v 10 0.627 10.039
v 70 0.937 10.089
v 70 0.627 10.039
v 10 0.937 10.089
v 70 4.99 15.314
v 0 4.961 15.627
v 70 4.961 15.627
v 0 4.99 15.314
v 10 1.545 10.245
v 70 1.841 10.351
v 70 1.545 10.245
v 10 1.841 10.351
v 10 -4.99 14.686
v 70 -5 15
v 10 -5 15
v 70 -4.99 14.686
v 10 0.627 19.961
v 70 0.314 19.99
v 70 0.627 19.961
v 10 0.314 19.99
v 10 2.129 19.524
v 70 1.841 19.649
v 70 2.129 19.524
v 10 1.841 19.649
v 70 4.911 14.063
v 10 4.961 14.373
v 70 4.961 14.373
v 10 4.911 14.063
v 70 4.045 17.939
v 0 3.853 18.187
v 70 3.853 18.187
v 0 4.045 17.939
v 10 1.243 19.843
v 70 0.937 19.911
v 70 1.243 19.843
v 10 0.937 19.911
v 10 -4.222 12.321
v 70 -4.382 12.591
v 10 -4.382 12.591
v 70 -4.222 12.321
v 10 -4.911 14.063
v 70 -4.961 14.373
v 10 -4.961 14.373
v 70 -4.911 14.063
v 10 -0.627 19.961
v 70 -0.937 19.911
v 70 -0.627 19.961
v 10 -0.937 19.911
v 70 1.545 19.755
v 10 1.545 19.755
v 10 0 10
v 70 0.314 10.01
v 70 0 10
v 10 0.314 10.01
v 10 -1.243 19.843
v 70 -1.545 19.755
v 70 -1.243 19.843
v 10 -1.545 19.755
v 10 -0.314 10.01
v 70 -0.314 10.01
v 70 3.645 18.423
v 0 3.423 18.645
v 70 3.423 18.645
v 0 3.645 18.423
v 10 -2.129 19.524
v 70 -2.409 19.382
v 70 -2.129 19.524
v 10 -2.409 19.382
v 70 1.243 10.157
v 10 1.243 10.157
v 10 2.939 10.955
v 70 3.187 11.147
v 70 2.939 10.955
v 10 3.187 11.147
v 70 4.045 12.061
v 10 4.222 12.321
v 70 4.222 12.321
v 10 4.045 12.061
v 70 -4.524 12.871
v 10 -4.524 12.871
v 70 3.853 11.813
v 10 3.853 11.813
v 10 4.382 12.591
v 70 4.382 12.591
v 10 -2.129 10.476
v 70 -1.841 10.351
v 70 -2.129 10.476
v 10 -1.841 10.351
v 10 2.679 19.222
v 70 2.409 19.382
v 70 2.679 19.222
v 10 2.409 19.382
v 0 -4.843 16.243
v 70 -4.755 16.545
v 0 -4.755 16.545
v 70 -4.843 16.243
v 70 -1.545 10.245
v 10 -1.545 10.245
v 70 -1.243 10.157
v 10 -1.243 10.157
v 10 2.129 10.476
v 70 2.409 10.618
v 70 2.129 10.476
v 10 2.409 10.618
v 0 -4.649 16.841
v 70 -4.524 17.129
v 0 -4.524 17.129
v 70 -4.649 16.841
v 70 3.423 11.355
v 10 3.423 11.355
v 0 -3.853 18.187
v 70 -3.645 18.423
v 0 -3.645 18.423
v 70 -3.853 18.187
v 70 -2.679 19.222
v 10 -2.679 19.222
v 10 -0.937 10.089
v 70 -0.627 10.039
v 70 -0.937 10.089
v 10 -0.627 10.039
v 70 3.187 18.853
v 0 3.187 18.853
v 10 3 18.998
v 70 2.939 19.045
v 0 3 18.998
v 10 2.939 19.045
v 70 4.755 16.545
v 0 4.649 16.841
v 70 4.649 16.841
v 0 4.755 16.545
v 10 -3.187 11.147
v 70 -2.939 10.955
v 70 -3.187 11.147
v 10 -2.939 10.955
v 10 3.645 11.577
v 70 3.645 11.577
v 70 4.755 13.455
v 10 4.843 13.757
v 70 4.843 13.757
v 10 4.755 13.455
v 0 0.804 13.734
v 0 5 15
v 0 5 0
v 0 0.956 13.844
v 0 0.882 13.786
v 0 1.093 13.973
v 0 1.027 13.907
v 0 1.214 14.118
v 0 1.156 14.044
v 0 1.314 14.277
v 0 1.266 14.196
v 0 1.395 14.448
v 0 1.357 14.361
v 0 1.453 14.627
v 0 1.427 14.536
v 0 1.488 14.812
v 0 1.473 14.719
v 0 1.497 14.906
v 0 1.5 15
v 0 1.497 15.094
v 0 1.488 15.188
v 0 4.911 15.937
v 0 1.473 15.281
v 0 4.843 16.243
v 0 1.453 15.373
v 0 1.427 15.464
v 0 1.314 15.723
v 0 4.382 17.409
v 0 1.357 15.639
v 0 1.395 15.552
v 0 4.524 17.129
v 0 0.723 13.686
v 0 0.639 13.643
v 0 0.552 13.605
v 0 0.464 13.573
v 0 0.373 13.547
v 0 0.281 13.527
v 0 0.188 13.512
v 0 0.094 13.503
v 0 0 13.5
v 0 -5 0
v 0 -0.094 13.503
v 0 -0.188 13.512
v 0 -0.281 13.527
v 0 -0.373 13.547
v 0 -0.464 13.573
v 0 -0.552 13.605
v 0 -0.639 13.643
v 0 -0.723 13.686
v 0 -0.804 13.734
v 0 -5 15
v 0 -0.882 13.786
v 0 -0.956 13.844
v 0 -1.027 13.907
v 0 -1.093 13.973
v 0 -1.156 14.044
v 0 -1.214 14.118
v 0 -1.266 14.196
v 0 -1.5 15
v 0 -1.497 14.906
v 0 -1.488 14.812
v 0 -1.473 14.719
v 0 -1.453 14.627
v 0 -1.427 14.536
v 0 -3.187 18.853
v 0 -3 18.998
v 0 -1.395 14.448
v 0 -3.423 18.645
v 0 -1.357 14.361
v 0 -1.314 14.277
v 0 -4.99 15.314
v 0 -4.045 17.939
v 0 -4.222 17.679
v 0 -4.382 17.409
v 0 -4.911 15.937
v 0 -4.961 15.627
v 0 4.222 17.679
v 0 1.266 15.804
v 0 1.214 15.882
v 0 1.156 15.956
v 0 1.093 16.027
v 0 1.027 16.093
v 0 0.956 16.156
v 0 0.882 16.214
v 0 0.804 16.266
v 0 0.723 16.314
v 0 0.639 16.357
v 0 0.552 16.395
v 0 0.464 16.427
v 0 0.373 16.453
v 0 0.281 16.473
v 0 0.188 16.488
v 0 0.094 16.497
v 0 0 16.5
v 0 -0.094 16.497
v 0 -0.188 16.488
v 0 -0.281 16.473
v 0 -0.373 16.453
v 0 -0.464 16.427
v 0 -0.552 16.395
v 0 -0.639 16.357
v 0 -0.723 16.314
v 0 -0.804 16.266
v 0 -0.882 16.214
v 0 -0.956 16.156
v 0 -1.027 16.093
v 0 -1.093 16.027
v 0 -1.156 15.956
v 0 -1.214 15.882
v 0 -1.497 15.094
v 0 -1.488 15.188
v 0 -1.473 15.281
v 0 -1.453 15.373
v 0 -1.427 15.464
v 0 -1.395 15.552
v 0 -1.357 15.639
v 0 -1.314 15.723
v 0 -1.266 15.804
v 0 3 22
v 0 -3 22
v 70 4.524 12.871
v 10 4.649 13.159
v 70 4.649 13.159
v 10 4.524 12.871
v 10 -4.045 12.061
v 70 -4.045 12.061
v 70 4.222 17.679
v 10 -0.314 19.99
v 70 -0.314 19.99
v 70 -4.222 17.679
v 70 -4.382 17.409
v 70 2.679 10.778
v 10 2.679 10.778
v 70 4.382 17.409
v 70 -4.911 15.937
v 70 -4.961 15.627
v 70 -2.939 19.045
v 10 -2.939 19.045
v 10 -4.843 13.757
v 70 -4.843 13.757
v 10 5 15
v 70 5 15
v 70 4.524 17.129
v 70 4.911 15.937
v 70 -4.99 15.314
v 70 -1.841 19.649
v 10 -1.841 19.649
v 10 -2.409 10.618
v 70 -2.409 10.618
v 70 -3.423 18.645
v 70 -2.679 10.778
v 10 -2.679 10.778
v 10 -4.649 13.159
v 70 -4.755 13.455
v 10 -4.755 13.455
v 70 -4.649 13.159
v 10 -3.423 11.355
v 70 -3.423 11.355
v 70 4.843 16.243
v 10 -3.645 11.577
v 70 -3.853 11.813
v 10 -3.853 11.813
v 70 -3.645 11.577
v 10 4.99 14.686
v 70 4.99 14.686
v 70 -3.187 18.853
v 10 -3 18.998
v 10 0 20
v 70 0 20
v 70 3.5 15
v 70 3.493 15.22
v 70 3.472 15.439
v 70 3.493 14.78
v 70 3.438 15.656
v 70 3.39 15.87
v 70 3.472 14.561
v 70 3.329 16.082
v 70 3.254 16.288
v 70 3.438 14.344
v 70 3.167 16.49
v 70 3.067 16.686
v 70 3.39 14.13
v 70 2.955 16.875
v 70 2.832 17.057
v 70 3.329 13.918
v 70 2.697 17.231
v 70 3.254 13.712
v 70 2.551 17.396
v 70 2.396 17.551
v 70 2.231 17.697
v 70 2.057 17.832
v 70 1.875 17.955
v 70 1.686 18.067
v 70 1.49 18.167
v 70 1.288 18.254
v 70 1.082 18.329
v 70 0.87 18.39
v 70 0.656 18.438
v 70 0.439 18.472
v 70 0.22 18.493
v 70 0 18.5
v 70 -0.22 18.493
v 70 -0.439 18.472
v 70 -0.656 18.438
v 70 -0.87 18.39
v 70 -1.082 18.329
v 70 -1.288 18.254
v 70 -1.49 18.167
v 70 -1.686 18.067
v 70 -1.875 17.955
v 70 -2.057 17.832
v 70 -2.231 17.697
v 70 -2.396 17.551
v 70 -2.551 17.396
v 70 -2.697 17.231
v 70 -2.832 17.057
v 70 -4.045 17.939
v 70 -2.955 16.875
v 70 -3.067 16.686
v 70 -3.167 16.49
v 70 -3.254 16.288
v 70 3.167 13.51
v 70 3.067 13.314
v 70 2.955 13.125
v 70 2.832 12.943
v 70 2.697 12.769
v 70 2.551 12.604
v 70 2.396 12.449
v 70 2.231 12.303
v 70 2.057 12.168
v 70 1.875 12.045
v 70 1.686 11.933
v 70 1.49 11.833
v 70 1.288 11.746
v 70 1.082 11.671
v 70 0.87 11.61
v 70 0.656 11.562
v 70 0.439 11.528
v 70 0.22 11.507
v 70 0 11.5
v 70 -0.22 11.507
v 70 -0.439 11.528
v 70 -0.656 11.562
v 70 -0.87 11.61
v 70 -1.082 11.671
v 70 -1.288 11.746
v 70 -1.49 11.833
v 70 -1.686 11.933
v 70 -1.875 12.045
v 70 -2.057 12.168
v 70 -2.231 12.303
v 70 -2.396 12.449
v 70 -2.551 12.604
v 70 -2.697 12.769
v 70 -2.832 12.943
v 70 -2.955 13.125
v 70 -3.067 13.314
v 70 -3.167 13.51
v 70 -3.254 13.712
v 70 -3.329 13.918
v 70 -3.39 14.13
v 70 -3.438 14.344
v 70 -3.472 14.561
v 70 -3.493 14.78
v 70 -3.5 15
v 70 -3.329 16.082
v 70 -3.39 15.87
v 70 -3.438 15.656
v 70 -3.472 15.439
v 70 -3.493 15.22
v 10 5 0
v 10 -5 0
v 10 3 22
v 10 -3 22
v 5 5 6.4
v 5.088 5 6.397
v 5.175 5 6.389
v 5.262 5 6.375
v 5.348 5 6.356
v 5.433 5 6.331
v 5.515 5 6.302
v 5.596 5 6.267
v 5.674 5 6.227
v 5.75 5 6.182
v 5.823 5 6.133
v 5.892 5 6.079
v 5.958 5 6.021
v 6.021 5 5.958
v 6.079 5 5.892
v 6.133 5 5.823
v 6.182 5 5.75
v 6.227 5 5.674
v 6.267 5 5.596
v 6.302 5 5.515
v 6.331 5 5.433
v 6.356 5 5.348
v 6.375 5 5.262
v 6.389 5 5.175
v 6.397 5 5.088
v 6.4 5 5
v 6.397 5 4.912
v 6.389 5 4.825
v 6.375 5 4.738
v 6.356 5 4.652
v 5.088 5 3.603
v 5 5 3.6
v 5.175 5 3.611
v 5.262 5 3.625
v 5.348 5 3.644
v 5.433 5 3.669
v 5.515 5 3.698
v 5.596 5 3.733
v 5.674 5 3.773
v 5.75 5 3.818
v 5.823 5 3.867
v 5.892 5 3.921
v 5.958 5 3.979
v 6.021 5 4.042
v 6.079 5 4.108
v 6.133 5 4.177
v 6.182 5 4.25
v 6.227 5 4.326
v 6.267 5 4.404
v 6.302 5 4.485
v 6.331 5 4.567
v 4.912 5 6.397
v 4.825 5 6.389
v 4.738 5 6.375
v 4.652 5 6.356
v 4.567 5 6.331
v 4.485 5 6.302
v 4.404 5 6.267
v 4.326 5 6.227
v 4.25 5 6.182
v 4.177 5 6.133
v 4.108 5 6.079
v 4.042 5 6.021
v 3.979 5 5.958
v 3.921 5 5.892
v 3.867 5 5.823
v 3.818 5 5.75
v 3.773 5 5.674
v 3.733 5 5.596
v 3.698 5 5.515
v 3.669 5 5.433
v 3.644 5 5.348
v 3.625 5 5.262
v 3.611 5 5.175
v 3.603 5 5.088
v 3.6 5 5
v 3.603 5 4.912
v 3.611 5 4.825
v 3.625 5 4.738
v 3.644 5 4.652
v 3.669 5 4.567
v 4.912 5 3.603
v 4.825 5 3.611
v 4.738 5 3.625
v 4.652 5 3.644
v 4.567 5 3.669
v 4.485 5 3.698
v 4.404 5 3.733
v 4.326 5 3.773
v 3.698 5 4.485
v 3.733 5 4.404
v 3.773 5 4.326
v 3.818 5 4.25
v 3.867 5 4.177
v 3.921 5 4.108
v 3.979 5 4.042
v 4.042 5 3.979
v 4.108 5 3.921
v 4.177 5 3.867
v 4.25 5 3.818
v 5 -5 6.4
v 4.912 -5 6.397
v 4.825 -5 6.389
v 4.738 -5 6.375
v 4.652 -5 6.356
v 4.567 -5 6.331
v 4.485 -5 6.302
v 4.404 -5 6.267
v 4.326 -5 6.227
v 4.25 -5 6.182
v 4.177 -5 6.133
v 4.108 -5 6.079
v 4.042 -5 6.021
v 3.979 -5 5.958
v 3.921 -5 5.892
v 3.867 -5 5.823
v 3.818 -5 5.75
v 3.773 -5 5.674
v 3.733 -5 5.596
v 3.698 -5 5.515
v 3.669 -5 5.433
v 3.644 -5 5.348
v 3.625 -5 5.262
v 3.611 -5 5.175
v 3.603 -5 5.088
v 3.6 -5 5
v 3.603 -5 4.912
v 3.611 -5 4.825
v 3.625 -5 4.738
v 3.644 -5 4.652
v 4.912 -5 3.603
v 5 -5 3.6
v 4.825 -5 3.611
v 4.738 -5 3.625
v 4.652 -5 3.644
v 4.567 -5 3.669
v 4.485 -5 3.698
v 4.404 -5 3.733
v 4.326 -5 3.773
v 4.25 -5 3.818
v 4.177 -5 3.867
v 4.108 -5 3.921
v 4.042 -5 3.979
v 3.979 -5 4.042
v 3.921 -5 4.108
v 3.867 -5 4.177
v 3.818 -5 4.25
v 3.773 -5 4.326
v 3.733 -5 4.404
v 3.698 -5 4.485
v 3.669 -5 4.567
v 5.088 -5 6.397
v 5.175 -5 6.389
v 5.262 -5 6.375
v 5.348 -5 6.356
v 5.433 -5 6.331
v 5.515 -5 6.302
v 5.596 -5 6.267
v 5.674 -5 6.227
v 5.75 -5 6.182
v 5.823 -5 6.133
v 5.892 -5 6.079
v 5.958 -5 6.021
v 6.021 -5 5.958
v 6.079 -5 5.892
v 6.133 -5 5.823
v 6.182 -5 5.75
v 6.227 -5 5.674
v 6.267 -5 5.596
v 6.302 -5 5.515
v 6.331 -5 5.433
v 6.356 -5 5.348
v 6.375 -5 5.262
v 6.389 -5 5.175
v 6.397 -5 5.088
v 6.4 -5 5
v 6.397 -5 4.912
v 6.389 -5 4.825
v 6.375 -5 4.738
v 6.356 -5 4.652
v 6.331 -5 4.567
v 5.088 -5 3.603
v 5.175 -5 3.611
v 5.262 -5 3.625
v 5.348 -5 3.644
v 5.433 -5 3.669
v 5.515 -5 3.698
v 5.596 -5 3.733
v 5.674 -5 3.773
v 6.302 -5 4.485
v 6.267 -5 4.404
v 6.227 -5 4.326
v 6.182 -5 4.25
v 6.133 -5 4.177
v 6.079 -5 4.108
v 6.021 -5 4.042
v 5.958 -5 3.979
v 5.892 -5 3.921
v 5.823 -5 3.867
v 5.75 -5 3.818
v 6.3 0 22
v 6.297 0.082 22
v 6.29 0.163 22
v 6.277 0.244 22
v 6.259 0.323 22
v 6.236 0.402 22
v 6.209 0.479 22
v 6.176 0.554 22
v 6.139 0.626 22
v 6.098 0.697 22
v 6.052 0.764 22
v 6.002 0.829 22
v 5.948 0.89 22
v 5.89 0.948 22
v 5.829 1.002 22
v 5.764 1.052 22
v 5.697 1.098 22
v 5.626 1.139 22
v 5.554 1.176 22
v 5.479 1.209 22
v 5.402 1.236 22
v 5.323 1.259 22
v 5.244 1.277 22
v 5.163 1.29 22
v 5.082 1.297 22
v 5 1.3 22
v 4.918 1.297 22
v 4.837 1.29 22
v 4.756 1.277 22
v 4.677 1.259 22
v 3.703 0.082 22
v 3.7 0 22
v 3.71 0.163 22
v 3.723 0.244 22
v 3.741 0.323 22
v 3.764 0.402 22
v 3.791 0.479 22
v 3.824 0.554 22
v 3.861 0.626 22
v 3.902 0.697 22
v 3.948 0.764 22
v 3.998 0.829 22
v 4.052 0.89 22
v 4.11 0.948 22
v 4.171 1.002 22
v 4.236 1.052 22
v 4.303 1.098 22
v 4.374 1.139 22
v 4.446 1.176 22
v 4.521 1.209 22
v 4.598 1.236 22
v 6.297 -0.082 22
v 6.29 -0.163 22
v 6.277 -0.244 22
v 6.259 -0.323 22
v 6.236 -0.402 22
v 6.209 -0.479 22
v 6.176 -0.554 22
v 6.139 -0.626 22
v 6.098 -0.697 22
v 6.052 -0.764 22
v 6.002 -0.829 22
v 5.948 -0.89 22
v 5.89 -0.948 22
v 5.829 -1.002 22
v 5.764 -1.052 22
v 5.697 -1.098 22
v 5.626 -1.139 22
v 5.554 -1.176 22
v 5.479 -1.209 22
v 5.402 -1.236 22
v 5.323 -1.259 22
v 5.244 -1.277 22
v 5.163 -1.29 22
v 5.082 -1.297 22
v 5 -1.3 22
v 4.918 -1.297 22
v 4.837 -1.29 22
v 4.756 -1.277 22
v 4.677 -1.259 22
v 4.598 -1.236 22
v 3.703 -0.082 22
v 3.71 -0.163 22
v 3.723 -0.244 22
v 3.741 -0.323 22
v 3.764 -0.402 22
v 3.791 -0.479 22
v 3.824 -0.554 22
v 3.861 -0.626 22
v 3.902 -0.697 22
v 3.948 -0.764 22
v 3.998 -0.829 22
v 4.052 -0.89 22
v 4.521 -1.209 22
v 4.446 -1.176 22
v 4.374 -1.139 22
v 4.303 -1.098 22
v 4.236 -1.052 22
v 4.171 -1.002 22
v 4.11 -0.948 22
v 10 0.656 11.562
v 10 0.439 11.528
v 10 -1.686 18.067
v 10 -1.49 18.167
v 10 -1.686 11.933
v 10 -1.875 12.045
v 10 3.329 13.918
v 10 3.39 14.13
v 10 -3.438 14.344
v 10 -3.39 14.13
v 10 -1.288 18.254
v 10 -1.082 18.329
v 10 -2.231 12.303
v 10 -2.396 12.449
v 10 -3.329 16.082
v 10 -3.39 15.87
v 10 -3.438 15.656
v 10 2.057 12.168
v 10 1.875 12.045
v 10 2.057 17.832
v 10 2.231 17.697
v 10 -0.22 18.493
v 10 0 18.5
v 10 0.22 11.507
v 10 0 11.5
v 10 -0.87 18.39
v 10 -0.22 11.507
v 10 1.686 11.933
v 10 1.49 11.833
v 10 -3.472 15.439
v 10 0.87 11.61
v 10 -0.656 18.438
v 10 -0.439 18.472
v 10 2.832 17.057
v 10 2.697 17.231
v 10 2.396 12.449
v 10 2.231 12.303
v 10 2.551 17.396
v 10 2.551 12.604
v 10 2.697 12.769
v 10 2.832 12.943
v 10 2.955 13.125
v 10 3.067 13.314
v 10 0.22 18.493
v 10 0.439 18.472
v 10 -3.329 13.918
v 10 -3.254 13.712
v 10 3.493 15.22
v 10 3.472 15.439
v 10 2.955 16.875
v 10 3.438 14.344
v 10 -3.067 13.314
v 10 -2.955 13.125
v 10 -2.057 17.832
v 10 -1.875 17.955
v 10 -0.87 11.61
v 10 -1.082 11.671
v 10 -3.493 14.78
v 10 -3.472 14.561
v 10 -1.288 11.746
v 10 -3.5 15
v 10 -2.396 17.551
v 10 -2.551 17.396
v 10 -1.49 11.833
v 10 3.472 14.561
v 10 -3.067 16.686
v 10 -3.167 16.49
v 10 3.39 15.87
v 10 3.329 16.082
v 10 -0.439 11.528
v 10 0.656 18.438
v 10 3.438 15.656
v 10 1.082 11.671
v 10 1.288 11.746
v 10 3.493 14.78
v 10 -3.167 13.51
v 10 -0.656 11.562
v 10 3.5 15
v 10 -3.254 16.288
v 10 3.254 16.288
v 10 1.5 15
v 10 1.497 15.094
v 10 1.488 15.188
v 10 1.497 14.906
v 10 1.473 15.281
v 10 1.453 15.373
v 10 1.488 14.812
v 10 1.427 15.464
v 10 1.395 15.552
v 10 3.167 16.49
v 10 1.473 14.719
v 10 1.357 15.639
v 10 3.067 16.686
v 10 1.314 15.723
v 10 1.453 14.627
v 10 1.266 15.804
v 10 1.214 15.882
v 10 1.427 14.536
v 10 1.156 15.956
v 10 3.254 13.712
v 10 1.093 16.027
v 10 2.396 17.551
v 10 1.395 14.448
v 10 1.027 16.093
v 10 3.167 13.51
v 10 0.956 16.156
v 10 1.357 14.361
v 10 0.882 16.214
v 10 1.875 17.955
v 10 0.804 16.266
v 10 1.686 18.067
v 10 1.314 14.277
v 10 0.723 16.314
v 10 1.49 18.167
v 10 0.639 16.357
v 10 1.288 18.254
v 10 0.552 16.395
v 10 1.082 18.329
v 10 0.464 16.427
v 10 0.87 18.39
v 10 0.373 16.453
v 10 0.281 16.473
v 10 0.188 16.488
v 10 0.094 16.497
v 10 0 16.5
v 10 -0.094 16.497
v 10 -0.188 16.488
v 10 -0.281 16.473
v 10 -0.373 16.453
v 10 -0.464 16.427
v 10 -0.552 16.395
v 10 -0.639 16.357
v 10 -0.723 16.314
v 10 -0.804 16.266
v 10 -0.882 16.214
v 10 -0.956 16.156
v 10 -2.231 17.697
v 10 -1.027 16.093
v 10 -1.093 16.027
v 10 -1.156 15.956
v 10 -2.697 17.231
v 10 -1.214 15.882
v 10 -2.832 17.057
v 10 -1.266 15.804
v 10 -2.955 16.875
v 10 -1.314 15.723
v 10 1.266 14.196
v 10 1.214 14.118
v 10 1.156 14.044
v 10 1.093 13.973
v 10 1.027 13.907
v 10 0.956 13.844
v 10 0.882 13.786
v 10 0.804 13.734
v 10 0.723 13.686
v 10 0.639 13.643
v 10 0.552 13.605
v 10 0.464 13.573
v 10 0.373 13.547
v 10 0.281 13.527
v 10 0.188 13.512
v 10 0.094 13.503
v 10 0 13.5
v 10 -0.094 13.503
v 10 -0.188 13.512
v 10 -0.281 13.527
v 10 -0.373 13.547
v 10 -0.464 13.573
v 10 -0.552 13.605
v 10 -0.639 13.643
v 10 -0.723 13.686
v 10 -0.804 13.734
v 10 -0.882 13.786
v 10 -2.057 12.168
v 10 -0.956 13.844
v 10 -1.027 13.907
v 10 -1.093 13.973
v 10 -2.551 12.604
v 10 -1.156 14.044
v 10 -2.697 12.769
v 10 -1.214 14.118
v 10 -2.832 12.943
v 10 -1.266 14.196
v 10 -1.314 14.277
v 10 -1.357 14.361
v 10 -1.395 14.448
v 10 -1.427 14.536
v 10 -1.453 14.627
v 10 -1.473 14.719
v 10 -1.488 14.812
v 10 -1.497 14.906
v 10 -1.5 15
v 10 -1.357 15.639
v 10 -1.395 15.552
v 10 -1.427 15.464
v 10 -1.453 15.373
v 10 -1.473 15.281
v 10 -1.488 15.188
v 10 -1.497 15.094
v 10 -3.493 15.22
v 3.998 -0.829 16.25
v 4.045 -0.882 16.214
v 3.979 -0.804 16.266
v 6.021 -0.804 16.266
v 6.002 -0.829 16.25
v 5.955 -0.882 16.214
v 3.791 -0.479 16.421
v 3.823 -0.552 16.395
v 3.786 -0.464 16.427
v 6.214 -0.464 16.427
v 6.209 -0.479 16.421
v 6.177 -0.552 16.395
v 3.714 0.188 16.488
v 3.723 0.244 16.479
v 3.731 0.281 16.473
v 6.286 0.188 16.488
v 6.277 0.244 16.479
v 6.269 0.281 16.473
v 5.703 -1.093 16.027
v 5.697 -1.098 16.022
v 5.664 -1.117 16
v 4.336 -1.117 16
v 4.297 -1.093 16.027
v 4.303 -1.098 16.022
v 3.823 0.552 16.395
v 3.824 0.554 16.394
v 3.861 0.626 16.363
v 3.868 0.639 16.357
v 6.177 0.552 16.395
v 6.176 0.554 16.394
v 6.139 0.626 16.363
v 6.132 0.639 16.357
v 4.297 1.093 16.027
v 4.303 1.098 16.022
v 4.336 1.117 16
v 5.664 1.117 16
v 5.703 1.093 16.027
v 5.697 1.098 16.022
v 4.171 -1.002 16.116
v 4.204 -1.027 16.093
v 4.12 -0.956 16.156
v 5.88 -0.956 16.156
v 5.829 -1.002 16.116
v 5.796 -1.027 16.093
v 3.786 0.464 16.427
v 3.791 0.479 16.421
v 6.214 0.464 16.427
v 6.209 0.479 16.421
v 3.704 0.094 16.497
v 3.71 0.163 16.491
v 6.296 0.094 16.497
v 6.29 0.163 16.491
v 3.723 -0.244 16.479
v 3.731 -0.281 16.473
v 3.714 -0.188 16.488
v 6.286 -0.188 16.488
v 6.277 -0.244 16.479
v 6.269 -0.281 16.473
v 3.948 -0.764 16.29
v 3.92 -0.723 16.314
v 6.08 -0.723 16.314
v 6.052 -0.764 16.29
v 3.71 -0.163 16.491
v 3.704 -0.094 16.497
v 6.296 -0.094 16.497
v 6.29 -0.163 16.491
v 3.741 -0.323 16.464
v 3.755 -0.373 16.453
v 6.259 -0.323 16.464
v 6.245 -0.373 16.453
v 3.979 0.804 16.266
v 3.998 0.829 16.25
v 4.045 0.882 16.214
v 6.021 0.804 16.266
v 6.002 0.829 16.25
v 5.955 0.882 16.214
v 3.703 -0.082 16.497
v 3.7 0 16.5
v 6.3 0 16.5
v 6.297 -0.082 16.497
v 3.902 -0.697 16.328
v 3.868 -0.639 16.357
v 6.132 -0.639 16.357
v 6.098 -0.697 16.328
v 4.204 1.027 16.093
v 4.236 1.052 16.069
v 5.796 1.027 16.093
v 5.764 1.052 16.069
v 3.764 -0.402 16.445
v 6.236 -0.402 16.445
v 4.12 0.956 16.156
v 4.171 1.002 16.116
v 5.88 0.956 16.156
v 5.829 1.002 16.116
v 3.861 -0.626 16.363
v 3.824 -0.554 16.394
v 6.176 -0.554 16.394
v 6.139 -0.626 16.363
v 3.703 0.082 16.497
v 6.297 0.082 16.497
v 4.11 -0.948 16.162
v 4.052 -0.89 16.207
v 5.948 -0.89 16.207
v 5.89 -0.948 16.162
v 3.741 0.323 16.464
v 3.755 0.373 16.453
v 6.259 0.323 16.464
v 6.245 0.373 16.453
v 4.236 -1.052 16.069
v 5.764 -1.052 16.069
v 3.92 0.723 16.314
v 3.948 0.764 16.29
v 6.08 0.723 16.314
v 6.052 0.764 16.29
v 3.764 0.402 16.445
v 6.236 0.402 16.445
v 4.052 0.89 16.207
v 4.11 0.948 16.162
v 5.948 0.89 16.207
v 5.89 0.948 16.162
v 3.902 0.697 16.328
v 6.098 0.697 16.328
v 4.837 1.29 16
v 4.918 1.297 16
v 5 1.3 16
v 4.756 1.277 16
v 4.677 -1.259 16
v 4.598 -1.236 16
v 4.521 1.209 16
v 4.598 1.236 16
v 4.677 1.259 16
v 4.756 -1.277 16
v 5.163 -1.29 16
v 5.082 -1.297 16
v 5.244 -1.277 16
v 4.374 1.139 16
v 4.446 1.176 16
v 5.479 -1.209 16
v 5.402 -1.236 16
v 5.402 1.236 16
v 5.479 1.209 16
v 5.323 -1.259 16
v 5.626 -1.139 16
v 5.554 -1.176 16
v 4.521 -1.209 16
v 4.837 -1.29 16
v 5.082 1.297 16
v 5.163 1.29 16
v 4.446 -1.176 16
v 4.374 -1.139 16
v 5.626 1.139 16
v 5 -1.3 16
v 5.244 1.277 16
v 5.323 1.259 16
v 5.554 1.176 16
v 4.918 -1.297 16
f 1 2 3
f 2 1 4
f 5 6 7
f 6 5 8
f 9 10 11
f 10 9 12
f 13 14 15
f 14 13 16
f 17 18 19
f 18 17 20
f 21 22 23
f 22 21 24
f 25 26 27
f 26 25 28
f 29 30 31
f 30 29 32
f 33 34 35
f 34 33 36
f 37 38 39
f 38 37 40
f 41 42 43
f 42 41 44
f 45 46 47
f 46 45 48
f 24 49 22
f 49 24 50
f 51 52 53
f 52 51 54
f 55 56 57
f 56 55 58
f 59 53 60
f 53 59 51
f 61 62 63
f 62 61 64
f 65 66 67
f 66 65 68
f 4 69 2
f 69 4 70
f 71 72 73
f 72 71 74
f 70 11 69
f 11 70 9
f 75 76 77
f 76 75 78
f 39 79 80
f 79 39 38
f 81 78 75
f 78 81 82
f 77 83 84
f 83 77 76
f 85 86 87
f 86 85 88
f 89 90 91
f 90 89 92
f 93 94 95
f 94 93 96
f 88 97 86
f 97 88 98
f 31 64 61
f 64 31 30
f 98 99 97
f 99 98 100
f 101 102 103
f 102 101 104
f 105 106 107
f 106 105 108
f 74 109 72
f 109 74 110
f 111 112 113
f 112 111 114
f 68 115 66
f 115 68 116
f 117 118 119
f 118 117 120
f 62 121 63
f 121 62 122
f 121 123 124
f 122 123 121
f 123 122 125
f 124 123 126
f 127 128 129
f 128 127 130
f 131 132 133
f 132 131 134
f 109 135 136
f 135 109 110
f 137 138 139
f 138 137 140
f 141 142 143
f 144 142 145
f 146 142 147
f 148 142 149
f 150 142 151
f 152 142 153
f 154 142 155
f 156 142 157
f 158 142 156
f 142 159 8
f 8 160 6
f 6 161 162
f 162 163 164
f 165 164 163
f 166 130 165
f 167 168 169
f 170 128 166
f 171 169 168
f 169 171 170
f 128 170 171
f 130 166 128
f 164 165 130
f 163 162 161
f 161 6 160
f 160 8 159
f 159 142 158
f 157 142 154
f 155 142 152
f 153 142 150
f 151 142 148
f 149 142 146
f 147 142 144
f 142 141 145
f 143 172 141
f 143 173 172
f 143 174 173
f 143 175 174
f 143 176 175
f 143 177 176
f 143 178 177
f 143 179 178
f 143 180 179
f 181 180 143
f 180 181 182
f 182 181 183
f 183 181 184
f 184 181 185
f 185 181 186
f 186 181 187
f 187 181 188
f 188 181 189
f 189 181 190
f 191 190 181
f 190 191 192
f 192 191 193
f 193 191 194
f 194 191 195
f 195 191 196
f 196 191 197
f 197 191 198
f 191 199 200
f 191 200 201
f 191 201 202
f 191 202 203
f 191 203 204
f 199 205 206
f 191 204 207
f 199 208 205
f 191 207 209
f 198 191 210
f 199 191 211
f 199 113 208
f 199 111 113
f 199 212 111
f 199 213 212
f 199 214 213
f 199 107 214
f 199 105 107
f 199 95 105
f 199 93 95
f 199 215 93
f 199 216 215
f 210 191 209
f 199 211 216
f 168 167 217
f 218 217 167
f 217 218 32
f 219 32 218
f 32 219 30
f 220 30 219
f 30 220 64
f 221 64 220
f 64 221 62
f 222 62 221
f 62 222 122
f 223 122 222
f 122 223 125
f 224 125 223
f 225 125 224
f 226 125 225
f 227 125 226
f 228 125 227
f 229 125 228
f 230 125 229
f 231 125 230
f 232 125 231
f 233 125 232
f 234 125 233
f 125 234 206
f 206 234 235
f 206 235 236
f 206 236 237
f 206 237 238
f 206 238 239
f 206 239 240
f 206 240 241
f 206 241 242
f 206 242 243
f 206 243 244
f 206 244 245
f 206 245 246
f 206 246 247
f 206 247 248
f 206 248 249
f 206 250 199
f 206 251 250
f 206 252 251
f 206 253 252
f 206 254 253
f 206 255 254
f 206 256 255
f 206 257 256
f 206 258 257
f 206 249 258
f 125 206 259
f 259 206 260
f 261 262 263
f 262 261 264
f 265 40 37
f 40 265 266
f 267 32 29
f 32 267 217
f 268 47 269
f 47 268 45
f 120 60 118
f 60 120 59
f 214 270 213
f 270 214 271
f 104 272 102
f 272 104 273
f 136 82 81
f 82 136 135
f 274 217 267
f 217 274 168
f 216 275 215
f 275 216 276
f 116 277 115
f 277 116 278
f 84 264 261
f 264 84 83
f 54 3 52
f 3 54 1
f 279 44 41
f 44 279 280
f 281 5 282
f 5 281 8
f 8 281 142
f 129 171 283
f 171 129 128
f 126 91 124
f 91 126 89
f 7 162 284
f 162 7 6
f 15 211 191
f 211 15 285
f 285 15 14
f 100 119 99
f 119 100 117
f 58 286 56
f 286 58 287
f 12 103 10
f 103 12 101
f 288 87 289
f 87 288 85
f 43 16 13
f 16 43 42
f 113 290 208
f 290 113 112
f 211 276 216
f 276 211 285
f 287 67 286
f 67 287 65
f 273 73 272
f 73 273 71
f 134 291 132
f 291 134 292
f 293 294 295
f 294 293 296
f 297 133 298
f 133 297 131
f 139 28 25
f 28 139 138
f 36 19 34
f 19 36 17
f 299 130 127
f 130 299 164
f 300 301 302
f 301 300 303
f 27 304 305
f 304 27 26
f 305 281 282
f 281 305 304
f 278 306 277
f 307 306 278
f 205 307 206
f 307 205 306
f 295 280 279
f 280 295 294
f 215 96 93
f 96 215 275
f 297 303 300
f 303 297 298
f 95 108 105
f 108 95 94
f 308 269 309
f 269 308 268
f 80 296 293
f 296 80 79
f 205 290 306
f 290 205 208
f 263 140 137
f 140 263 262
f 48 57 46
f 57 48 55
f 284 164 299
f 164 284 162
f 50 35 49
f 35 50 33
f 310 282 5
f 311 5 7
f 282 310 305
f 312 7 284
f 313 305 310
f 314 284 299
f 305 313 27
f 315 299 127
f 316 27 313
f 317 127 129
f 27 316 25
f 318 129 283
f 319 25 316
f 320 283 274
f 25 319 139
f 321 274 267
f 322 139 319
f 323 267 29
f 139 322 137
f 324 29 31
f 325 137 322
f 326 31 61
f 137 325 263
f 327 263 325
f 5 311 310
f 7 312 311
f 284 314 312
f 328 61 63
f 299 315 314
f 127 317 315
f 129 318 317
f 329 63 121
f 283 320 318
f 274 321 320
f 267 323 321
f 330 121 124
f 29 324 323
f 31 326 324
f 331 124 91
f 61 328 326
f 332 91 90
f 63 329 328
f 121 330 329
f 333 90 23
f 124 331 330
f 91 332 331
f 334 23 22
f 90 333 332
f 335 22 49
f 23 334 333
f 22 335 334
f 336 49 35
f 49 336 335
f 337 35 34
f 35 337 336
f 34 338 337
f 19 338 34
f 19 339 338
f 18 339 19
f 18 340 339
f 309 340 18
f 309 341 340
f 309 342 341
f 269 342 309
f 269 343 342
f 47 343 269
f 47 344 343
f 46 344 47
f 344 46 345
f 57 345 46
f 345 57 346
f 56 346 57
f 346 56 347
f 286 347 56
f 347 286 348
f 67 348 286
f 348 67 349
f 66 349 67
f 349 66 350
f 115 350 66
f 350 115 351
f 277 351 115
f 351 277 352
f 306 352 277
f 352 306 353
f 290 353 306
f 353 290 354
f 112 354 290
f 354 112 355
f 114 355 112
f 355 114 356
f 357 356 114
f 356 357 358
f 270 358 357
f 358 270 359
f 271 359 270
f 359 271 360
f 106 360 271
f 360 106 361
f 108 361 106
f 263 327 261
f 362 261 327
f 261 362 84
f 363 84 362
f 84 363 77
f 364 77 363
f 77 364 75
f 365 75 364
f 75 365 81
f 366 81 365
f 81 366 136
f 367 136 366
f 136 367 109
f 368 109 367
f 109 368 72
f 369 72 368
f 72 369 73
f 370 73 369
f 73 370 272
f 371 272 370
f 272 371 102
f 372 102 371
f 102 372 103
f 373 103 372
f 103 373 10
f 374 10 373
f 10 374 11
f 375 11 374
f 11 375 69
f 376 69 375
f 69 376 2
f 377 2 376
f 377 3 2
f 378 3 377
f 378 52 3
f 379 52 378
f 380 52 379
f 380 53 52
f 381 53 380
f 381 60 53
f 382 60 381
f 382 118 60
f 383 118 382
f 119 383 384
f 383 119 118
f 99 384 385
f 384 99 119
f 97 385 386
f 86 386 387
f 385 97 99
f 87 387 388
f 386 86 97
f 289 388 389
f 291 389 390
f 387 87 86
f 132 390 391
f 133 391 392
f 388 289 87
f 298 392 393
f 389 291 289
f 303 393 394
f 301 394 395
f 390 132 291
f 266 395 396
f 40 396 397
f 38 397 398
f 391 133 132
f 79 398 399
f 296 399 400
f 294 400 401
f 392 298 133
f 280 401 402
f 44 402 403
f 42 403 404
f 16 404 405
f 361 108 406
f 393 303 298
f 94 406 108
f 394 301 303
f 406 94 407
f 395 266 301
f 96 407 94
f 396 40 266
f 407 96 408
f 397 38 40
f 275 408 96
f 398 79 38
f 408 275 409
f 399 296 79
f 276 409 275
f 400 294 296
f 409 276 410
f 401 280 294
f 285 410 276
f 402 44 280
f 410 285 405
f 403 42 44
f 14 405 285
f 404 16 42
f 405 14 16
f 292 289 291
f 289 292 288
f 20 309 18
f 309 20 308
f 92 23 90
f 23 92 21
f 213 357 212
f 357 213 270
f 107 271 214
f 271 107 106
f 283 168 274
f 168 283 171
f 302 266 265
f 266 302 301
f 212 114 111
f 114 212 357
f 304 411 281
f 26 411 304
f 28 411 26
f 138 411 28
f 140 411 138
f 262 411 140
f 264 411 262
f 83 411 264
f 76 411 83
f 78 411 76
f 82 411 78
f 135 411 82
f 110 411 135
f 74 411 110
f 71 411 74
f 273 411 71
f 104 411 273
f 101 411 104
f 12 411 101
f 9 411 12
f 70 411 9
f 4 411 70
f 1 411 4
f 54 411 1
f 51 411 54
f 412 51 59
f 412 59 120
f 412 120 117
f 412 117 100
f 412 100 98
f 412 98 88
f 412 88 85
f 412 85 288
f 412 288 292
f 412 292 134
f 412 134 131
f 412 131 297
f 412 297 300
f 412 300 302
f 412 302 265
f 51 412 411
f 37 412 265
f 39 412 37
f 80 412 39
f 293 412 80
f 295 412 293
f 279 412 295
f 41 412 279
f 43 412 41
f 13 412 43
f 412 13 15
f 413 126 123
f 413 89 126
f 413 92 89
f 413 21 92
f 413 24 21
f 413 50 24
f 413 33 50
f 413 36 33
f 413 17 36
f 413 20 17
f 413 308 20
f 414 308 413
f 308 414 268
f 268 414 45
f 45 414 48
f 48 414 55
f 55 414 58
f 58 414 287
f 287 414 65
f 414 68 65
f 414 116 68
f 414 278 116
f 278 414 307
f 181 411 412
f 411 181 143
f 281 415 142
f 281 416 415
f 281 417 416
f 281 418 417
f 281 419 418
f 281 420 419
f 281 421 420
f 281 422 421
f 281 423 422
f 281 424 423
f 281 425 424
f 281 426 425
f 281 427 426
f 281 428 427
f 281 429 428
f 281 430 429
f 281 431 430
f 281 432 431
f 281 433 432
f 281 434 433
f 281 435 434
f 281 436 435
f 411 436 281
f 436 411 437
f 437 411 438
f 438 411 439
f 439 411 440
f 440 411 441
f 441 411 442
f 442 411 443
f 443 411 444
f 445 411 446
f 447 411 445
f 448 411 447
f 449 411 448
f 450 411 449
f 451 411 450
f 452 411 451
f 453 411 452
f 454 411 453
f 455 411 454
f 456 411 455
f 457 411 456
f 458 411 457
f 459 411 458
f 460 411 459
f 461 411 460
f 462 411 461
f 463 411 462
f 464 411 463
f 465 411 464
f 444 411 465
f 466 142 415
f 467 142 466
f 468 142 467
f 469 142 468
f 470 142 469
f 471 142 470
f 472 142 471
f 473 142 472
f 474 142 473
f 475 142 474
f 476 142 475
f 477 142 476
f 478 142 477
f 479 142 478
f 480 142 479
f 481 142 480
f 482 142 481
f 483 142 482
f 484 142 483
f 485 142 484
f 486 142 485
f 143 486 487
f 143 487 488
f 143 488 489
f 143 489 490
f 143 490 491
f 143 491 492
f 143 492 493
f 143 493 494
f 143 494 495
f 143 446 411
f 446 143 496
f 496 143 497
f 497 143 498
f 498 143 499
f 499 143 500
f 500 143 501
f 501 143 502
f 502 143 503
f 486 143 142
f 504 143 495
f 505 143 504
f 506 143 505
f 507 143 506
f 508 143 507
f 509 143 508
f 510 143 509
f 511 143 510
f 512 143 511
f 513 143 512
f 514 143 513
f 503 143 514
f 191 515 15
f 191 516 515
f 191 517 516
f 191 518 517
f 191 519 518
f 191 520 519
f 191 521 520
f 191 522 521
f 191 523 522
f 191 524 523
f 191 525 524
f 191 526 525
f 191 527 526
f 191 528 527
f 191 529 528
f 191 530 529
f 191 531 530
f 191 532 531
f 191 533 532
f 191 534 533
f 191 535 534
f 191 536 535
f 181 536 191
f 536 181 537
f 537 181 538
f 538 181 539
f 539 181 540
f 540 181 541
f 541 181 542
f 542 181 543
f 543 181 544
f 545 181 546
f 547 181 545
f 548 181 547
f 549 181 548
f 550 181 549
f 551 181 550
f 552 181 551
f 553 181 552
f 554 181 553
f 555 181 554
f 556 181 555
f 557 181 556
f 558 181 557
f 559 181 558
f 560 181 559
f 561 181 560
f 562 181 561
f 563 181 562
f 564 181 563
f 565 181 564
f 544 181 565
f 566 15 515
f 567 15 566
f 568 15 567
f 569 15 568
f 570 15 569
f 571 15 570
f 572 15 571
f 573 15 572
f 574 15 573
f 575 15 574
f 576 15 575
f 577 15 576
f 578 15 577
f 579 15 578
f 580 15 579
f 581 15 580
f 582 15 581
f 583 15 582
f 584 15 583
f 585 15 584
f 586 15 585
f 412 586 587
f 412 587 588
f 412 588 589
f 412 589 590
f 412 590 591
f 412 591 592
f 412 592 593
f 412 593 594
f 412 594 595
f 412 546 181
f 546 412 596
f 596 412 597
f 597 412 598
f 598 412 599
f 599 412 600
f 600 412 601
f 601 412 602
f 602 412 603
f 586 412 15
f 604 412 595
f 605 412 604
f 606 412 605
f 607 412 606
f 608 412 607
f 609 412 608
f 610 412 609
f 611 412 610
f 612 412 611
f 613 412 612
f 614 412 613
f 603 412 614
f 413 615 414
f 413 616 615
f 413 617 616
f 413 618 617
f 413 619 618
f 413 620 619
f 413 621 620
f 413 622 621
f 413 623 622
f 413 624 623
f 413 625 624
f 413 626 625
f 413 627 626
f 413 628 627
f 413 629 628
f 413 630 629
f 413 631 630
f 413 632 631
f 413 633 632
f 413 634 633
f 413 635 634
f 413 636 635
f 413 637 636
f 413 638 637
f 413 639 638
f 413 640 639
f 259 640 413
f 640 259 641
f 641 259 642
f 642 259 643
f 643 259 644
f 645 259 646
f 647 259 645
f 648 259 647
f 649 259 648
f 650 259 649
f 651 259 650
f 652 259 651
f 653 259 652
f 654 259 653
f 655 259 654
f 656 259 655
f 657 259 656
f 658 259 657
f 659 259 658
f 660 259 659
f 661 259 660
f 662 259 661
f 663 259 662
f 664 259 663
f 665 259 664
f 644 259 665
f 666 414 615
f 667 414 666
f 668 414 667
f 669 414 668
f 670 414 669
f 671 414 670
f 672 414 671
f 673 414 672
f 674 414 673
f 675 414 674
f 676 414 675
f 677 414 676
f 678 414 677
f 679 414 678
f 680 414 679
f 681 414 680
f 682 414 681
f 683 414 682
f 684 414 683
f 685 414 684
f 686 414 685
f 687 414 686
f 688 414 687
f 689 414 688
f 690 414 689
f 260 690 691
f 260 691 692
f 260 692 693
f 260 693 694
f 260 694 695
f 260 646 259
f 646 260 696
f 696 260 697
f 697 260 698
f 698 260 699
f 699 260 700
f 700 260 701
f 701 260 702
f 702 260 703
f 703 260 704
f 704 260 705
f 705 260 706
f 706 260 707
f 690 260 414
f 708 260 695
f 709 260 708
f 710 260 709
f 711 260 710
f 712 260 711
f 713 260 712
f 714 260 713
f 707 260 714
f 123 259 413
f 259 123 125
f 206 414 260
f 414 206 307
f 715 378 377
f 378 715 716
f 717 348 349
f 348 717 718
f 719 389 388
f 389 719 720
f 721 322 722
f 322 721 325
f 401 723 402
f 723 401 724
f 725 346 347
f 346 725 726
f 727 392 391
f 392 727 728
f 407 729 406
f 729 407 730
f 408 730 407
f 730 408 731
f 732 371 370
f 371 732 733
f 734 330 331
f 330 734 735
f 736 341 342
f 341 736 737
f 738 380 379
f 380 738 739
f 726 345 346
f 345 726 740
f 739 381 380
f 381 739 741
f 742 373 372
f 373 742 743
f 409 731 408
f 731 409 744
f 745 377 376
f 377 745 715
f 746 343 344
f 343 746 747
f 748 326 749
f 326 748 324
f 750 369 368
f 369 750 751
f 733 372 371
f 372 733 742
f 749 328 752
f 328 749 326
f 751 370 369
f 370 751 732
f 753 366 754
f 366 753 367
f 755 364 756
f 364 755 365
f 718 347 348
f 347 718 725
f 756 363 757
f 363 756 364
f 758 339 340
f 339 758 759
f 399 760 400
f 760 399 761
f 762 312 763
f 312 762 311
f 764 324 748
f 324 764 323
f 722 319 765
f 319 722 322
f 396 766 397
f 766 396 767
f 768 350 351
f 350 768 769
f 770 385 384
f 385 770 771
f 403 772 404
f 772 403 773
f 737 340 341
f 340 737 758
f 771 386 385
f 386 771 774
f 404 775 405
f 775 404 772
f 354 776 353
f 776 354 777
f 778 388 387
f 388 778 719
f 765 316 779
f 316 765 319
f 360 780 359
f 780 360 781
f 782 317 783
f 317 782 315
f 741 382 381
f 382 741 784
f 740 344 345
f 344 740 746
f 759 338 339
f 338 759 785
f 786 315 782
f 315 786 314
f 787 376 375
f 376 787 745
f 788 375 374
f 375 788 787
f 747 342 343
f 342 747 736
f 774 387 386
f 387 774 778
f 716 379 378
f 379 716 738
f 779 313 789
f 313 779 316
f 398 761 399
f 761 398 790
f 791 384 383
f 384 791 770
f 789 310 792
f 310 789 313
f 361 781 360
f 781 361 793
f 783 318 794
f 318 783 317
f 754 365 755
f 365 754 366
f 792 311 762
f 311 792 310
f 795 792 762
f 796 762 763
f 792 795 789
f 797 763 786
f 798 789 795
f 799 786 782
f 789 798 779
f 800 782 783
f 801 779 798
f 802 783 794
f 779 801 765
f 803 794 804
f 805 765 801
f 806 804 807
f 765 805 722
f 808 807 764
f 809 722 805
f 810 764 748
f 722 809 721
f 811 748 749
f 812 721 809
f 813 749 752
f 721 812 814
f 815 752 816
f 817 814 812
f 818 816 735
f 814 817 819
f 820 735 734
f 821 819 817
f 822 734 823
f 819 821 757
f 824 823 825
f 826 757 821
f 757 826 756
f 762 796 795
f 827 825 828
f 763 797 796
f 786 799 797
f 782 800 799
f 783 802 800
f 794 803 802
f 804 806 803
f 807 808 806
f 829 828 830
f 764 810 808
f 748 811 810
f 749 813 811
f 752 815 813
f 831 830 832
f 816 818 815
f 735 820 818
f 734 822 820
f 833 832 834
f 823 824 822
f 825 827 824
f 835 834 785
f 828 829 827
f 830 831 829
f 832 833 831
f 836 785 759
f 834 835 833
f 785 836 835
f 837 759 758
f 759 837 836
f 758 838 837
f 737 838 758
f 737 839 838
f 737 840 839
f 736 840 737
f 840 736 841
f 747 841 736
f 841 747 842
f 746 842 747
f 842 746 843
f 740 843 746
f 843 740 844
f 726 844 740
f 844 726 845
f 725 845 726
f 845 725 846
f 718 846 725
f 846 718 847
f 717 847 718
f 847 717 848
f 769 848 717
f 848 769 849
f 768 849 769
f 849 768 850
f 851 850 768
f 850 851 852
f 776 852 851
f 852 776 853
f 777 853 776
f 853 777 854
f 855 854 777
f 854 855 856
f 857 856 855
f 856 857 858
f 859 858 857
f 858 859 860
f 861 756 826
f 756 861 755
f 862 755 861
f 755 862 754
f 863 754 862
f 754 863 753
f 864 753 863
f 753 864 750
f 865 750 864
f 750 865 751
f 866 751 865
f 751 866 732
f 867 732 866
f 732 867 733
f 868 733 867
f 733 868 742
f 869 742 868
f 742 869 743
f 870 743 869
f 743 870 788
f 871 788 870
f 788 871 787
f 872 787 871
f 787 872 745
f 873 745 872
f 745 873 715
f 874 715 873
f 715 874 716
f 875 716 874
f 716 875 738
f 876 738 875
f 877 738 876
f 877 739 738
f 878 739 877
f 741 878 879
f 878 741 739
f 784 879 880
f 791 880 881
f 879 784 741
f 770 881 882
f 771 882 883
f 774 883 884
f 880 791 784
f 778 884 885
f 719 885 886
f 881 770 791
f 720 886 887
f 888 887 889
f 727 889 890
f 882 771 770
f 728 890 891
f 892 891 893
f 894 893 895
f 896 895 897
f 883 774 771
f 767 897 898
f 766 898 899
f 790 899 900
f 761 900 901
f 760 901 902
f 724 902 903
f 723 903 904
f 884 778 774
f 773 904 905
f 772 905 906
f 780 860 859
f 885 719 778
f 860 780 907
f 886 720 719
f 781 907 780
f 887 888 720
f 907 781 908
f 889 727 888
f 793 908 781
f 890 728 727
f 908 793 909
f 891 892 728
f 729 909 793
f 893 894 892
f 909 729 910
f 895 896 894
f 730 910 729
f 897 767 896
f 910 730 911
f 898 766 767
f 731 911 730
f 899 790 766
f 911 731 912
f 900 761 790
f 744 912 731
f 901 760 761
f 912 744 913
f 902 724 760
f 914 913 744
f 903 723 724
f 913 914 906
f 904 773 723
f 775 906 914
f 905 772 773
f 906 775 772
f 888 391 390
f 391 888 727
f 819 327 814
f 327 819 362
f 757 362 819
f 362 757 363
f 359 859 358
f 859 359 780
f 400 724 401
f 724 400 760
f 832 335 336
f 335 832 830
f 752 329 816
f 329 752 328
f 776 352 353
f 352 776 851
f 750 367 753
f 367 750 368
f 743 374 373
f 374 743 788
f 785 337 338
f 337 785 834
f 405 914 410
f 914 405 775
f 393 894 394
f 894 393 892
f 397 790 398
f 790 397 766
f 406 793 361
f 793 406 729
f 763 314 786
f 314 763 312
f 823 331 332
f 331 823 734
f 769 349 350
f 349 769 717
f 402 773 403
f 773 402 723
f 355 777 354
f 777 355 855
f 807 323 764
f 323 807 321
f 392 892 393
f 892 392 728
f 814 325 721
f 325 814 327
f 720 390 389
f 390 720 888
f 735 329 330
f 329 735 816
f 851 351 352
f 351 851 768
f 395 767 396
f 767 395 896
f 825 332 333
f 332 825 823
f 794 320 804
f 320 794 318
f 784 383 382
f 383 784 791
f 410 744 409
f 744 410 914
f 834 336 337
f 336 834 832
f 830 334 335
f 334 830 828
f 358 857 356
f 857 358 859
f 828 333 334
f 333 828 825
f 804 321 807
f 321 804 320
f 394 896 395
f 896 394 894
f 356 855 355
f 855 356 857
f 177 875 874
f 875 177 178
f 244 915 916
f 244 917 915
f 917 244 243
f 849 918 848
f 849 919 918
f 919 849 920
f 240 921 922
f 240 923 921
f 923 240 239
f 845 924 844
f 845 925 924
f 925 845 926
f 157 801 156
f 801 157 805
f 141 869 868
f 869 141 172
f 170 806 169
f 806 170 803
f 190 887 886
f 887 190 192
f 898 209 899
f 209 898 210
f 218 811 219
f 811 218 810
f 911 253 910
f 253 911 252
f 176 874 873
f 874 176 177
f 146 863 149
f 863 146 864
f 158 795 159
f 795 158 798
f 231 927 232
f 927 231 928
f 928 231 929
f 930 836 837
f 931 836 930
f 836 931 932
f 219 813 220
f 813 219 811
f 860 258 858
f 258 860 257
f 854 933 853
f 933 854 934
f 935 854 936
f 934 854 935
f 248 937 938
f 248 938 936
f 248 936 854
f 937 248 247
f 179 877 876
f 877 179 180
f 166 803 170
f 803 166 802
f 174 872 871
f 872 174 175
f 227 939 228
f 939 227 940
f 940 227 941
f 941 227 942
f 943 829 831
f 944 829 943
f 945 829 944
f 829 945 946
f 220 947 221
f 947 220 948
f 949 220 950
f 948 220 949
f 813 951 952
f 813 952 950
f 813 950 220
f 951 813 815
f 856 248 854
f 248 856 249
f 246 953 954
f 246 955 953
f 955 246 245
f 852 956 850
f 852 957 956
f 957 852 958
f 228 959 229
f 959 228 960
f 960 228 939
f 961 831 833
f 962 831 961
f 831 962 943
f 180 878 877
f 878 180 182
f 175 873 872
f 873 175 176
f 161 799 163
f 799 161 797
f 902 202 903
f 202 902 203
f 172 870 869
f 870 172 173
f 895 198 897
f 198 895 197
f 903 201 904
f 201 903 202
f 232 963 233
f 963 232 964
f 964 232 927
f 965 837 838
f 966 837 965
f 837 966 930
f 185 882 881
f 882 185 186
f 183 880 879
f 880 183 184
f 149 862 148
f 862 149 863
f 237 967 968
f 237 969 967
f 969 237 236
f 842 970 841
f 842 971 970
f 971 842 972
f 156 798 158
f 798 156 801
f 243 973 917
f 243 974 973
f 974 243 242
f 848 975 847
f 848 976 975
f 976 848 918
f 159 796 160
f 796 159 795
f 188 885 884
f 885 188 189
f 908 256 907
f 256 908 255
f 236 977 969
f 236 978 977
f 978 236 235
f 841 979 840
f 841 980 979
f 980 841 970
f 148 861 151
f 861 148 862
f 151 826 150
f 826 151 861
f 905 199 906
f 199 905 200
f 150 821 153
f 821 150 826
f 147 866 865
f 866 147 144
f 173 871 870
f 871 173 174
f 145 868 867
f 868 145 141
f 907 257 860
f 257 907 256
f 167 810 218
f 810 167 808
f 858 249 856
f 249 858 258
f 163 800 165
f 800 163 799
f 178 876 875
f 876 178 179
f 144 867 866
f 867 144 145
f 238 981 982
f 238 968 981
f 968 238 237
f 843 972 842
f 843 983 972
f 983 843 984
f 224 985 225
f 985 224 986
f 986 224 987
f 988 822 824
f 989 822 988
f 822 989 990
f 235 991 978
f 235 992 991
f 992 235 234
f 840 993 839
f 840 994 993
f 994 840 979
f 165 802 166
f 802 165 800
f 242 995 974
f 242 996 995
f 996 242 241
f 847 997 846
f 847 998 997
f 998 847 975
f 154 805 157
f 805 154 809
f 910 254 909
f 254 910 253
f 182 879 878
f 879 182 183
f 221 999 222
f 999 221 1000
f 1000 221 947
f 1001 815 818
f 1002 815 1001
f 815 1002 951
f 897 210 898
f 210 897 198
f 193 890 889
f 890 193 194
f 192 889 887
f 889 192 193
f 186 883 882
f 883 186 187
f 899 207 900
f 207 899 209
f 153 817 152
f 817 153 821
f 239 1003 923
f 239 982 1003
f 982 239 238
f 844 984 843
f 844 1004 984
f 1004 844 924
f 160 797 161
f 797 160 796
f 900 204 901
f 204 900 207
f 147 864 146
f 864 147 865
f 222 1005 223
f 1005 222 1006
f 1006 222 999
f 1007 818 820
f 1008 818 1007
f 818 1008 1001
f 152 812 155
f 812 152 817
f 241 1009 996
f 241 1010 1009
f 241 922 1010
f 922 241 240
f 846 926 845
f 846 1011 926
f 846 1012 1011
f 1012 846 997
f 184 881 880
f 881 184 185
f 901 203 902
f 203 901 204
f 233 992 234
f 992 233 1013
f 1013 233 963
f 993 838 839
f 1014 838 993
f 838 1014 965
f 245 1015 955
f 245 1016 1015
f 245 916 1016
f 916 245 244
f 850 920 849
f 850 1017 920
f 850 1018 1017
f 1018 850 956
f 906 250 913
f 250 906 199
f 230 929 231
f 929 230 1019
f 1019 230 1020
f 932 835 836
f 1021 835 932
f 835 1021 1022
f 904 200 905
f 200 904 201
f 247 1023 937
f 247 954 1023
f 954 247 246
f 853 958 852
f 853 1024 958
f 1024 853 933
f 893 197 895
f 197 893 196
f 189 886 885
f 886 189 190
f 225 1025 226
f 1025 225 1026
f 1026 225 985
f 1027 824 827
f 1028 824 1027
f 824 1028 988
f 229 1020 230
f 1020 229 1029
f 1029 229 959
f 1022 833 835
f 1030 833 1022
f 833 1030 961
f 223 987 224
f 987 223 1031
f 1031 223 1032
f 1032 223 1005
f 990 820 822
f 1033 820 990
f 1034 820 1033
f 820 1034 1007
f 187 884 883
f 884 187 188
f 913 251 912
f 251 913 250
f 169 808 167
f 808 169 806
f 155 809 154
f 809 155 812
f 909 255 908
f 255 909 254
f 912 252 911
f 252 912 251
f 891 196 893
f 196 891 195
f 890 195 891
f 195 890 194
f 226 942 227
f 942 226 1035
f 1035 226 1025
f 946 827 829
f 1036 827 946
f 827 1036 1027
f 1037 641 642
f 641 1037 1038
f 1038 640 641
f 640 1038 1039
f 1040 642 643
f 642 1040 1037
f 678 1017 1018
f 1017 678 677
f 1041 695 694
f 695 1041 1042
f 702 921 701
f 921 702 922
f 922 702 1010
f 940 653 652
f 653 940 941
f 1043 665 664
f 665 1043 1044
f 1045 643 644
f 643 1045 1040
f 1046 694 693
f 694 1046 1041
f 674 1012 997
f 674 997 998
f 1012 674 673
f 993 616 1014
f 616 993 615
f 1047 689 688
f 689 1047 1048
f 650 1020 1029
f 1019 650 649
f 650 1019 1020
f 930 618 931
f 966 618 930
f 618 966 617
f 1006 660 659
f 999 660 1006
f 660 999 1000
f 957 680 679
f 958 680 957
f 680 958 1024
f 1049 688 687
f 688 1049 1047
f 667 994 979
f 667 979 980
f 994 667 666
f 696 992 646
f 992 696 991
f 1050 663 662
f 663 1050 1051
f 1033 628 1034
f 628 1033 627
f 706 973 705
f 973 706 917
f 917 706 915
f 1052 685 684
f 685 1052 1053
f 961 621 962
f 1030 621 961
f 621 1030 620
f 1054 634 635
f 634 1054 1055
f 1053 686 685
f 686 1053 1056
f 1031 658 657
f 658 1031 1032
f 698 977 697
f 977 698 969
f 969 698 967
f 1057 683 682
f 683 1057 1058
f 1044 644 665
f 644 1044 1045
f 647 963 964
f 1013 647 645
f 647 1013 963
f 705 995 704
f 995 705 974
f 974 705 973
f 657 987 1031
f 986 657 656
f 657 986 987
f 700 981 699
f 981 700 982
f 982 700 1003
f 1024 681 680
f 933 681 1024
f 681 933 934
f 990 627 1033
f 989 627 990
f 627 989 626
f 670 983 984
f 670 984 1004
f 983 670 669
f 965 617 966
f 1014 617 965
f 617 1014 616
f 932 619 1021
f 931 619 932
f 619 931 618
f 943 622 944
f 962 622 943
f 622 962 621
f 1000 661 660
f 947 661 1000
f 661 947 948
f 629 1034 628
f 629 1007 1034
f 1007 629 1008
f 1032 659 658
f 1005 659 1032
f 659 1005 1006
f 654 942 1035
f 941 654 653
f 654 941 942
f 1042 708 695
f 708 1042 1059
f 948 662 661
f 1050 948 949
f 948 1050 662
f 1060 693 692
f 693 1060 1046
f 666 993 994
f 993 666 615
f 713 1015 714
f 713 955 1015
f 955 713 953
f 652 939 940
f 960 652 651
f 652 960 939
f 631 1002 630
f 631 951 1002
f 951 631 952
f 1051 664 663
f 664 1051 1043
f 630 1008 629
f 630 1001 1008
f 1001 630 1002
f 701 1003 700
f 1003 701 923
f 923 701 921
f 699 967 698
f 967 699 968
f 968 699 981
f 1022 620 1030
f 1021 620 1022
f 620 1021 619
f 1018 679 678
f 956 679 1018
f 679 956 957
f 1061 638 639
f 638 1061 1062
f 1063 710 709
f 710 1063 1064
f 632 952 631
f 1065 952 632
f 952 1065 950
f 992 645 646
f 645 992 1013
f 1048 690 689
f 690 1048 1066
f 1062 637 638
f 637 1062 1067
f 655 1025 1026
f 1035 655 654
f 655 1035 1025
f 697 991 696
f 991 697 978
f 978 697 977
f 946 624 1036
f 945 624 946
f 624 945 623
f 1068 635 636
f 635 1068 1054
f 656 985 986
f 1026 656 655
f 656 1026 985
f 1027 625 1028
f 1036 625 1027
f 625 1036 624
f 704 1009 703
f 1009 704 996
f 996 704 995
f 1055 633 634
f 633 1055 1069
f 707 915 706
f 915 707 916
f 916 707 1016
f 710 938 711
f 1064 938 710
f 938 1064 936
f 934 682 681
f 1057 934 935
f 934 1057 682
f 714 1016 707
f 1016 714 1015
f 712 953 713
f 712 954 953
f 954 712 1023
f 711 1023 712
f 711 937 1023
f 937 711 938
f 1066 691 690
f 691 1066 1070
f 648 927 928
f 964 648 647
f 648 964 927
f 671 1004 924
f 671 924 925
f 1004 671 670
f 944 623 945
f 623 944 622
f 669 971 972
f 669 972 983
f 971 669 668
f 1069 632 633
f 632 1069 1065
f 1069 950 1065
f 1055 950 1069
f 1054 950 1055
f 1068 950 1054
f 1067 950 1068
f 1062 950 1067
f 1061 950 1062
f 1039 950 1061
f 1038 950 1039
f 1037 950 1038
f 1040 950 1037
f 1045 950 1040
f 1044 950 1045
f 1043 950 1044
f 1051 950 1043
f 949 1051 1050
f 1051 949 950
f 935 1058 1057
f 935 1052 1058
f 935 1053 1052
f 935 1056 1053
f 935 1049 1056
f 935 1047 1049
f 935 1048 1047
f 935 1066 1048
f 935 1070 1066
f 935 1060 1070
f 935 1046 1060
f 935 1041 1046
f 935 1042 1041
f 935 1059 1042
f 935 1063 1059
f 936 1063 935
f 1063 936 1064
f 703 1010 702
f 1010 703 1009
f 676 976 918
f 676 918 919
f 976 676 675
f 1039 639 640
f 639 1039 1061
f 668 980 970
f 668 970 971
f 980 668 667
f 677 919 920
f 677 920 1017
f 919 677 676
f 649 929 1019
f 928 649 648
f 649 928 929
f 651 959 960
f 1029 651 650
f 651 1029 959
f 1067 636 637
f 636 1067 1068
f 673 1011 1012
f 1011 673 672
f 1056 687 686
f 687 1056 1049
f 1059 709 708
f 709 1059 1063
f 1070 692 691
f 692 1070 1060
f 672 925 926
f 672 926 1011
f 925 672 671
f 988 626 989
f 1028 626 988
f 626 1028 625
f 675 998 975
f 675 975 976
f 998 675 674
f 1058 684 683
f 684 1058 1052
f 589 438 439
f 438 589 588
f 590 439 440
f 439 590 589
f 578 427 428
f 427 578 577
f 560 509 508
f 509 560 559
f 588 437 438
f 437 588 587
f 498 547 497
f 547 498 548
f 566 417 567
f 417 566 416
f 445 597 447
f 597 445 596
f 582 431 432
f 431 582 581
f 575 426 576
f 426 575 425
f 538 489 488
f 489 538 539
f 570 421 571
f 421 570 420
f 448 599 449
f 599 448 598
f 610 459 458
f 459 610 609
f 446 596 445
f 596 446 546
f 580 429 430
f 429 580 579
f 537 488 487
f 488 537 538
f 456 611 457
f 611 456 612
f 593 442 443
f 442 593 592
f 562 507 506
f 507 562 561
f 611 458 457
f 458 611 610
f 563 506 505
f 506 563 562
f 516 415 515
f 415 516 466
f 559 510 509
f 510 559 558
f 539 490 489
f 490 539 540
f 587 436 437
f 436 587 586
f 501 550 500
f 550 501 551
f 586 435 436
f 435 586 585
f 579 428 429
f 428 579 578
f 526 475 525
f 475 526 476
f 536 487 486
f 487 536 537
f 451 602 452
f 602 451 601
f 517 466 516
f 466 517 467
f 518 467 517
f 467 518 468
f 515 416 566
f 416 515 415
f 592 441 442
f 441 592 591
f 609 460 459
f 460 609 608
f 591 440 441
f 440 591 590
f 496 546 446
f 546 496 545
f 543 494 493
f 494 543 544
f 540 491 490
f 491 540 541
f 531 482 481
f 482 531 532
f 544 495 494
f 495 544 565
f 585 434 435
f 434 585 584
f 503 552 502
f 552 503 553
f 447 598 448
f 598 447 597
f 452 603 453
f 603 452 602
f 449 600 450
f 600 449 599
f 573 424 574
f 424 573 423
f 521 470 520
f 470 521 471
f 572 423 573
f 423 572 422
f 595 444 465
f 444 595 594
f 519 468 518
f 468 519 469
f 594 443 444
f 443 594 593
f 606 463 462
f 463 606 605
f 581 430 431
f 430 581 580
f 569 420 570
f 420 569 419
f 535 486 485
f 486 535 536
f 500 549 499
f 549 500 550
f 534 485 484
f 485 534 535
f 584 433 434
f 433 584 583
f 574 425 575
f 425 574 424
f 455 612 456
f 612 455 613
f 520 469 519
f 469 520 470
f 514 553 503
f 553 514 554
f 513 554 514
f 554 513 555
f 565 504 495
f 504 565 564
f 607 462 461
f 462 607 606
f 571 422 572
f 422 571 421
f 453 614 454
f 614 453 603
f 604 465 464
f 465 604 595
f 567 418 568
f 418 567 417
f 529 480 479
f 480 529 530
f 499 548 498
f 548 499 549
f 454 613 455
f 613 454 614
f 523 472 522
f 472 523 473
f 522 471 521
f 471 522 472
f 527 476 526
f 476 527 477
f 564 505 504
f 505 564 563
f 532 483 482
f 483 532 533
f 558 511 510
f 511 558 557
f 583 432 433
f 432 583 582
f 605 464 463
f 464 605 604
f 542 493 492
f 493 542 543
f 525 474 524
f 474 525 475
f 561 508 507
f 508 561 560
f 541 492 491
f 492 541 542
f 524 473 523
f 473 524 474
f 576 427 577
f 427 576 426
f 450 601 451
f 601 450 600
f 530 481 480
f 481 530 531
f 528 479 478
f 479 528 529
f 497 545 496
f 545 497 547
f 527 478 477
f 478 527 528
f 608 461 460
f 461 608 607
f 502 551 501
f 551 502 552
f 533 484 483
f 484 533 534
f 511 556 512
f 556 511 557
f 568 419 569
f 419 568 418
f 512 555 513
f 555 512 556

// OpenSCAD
difference(){
	union(){ 
        
        translate([0,0,15]){
            rotate(a = [0,90,0]) {
                cylinder(h=70, r=5, $fn=100, center=false);
            }
        }	
        translate([0,-5,0]){
           cube([10,10,15], center=false);
        }
        translate([0,-3,10]){
           cube([10,6,12], center=false);
        }
    
	}
	union() {


        translate([10,0,15]){
            rotate(a = [0,90,0]) {
                cylinder(h=320, r=3.5, $fn=100, center=false);
            }
        }	
        translate([-10,0,15]){
            rotate(a = [0,90,0]) {
                cylinder(h=320, r=1.5, $fn=100, center=false);
            }
        }	
        
        
        translate([5,00,16]){
            rotate(a = [0,0,90]) {
                cylinder(h=300, r=1.3, $fn=100, center=false);
            }
        }	
        translate([5,10,5]){
            rotate(a = [90,0,0]) {
                cylinder(h=300, r=1.4, $fn=100, center=false);
            }
        }


	}
}
